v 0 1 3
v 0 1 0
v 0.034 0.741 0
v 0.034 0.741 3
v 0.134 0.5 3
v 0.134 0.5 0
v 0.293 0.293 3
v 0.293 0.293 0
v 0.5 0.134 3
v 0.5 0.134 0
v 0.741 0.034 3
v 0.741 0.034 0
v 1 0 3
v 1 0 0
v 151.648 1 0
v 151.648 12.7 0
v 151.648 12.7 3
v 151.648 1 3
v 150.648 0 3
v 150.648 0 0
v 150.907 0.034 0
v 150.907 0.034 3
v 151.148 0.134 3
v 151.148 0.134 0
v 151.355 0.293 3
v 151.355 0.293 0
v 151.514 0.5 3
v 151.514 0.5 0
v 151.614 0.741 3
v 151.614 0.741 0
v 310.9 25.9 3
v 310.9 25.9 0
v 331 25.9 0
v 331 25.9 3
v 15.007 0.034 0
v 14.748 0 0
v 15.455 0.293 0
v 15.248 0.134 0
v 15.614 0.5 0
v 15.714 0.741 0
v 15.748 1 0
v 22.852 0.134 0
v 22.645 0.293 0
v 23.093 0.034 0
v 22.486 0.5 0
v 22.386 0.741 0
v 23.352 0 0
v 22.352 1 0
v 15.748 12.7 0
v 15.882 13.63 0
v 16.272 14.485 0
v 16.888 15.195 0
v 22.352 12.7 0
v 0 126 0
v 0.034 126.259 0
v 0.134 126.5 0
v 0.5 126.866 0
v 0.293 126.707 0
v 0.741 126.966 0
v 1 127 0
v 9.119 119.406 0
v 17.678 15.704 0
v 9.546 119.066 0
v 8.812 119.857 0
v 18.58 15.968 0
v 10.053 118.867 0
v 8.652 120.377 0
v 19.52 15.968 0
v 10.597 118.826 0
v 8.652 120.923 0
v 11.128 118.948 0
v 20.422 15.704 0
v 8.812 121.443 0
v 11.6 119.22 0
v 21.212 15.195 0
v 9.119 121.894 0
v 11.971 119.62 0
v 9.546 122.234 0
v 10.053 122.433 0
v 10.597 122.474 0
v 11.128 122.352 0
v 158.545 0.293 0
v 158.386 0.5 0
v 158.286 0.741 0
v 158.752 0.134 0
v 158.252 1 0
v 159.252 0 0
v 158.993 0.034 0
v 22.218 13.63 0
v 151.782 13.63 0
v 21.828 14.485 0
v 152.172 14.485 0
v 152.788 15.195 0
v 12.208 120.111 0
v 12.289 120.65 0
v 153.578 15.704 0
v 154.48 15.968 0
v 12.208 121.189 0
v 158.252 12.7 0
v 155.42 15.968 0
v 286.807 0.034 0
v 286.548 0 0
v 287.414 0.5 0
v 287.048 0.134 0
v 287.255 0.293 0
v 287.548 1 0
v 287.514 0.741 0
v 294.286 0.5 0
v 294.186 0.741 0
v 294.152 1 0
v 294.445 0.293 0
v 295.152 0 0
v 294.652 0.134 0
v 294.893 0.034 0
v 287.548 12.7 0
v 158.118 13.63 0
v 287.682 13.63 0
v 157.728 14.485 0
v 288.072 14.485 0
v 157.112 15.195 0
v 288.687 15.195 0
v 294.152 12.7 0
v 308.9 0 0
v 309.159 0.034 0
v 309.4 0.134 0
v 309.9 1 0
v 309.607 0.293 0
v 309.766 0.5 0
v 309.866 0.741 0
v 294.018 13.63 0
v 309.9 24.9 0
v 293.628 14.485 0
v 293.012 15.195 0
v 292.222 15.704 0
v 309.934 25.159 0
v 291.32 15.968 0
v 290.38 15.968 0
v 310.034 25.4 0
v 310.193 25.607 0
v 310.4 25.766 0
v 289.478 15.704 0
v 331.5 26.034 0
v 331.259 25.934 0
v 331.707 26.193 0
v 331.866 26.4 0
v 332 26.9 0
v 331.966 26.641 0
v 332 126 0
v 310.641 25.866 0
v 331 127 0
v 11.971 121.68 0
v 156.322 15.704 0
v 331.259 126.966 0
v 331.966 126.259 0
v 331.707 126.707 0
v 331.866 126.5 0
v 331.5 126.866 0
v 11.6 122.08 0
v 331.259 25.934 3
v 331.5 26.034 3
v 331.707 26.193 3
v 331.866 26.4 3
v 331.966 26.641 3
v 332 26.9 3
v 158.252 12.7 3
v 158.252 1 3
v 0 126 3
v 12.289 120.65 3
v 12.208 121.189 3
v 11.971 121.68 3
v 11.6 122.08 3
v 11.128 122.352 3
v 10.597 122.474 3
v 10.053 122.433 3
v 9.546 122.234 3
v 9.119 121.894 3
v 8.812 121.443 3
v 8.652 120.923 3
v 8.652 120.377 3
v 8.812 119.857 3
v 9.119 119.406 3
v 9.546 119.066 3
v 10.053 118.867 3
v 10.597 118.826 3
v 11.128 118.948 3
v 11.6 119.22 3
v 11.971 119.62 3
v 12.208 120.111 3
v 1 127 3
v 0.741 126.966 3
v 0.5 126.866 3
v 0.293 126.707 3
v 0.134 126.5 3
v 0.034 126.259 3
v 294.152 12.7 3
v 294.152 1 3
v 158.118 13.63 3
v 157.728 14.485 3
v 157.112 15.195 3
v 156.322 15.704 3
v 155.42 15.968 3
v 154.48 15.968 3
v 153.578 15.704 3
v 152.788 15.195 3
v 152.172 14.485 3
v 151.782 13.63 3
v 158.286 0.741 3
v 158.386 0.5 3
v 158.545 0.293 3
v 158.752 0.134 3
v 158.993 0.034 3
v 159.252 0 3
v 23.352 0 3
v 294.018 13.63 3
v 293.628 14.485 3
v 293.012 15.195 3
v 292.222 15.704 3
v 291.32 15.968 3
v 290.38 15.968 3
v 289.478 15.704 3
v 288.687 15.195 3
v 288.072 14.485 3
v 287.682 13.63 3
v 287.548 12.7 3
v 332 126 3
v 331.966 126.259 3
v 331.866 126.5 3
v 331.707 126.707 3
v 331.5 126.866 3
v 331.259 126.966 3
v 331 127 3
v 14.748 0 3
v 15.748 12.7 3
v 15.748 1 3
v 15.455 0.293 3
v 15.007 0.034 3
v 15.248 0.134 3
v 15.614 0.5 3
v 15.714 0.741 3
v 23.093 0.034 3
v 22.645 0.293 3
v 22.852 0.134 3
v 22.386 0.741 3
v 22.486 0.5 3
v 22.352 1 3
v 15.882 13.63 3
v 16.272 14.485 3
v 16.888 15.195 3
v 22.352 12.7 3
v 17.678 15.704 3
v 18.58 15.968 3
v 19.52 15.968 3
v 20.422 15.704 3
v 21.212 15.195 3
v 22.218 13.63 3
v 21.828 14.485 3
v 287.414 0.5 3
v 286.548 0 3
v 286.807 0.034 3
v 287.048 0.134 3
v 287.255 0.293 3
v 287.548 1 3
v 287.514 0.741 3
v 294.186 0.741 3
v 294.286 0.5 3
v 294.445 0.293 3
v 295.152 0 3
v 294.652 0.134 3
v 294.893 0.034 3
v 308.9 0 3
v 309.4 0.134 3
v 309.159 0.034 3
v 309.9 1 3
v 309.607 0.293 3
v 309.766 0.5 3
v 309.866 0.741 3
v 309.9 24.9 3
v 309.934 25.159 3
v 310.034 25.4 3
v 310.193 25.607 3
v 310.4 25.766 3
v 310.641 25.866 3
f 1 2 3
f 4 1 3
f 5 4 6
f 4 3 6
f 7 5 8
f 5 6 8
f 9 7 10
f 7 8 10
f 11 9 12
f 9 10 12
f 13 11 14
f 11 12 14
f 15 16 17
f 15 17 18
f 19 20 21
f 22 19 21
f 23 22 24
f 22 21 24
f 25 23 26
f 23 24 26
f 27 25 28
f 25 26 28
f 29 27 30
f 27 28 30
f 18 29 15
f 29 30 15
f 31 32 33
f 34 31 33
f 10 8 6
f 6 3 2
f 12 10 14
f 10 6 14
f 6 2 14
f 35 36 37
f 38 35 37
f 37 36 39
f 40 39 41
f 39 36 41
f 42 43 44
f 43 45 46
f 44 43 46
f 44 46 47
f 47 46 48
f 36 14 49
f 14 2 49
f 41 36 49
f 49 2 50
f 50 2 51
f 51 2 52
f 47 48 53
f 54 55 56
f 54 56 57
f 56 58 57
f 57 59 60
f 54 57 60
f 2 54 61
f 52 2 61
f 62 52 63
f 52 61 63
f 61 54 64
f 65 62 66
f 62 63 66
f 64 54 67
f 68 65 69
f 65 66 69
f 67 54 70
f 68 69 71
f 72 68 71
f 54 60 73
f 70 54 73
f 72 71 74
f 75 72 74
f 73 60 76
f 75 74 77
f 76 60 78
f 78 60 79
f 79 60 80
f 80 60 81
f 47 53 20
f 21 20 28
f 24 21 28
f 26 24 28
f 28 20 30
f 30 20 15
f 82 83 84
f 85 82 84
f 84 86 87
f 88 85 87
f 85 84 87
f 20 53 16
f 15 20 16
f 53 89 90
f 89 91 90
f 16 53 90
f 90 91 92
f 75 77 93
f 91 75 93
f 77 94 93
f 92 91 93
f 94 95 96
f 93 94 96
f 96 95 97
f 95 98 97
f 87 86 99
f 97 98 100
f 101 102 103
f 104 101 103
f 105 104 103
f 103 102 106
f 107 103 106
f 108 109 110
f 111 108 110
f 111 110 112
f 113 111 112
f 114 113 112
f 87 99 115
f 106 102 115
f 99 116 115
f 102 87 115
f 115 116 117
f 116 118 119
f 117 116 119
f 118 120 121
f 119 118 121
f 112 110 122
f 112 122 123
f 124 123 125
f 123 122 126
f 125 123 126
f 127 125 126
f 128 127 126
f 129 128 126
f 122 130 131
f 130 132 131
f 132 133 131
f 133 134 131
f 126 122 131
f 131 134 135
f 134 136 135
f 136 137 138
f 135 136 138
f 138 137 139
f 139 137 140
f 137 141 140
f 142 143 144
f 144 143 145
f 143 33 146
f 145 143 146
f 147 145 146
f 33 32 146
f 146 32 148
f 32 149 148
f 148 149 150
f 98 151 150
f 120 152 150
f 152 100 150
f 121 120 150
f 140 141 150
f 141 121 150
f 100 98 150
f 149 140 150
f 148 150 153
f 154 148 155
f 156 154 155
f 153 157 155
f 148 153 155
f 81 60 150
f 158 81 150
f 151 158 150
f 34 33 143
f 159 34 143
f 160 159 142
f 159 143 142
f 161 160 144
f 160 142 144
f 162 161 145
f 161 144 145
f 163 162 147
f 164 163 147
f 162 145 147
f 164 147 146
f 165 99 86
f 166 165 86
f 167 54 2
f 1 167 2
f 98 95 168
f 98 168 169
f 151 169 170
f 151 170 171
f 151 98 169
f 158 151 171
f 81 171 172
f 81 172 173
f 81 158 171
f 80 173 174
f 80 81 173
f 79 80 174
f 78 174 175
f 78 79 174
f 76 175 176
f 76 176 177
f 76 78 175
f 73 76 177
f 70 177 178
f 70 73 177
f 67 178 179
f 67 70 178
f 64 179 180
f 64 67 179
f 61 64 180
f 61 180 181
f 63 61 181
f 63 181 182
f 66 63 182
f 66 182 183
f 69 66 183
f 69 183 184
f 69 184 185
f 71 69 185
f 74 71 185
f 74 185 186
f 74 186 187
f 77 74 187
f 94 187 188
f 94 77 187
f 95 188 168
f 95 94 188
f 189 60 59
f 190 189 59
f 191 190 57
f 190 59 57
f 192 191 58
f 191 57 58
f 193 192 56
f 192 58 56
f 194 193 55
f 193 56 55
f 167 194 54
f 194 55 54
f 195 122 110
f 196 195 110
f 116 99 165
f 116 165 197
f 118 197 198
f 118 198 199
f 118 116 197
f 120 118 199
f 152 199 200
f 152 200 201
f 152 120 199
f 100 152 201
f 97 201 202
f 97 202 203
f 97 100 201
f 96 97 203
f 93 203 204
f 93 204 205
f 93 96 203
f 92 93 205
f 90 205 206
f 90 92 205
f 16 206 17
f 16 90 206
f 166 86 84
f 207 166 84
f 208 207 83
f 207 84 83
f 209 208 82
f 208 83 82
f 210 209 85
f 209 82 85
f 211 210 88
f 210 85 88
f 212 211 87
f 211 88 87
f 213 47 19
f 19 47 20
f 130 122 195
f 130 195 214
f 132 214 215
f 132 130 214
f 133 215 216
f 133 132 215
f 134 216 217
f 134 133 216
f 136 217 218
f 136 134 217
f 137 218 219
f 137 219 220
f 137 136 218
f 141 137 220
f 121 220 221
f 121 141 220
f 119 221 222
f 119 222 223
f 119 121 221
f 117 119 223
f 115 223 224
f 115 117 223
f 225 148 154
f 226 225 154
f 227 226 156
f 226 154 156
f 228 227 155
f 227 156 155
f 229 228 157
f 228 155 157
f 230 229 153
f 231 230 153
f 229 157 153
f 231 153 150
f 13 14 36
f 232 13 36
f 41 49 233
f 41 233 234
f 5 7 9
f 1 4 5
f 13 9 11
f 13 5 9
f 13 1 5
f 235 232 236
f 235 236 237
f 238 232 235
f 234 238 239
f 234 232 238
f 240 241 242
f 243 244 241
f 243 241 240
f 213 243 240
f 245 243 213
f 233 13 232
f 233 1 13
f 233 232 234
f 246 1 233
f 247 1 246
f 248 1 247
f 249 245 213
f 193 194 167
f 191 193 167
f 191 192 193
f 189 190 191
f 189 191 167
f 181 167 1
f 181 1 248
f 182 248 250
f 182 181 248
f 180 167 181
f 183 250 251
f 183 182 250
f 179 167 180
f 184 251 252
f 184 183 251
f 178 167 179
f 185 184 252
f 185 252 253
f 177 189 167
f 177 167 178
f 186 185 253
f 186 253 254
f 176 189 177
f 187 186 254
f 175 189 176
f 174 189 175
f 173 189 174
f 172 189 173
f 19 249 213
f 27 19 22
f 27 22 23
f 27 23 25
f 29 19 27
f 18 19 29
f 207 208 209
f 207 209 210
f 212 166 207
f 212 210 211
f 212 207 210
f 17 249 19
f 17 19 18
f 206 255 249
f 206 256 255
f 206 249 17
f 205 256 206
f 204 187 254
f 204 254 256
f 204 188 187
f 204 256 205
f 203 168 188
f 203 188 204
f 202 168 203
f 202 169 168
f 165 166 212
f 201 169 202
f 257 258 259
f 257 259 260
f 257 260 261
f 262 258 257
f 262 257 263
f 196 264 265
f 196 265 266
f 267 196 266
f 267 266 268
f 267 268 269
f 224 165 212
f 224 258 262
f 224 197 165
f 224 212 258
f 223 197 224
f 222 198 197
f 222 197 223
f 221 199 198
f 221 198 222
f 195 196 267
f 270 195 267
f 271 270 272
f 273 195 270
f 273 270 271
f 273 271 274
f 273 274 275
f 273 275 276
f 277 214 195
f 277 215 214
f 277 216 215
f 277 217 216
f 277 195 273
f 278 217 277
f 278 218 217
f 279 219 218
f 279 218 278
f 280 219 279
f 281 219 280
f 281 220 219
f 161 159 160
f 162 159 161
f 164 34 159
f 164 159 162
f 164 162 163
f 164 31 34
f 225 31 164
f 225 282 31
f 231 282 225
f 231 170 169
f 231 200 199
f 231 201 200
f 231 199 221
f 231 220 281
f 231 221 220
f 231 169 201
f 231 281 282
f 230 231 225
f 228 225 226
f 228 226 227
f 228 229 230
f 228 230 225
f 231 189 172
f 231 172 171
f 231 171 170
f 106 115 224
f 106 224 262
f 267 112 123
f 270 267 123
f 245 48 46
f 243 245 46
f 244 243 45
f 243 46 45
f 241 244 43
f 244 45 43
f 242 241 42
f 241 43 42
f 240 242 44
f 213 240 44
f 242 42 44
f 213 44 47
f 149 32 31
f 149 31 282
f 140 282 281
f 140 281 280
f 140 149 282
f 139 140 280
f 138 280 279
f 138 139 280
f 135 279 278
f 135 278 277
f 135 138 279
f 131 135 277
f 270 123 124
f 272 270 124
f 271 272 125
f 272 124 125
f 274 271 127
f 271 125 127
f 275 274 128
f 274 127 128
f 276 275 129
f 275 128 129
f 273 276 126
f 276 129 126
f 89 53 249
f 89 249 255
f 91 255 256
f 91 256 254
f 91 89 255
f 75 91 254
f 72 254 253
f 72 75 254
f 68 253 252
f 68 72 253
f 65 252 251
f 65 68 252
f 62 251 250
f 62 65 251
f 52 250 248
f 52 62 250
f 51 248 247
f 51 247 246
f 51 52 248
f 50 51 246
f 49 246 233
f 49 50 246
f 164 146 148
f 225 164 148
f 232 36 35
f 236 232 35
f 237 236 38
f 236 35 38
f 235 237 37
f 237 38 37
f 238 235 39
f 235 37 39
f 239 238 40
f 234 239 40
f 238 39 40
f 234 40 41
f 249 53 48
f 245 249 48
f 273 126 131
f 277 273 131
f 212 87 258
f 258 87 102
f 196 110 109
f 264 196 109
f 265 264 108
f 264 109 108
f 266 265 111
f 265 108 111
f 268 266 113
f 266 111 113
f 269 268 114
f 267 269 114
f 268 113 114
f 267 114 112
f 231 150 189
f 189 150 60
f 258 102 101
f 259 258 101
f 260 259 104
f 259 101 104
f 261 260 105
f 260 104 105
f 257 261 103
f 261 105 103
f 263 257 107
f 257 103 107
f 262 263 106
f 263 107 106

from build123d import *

# Parameters (mm, degrees)
SKETCH_R  = 1.8288
PAD_DEPTH = 3


with BuildPart() as part:
    # Sketch → Pad (new body)
    with BuildSketch(Plane.XY):
        with BuildLine():
            Line((0, 126), (0, 1))
            ThreePointArc((0, 1), (0.292893, 0.292893), (1, 0))
            Line((1, 0), (14.748, 0))
            ThreePointArc((14.748, 0), (15.455107, 0.292893), (15.748, 1))
            Line((15.748, 12.7), (15.748, 1))
            ThreePointArc((22.352, 12.7), (19.05, 16.002), (15.748, 12.7))
            Line((22.352, 12.7), (22.352, 1))
            ThreePointArc((22.352, 1), (22.644893, 0.292893), (23.352, 0))
            Line((23.352, 0), (150.6479, 0))
            ThreePointArc((150.6479, 0), (151.355007, 0.292893), (151.6479, 1))
            Line((151.6479, 12.7), (151.6479, 1))
            ThreePointArc((158.2519, 12.7), (154.9499, 16.002), (151.6479, 12.7))
            Line((158.2519, 12.7), (158.2519, 1))
            ThreePointArc((158.2519, 1), (158.544793, 0.292893), (159.2519, 0))
            Line((159.2519, 0), (286.5478, 0))
            ThreePointArc((286.5478, 0), (287.254907, 0.292893), (287.5478, 1))
            Line((287.5478, 12.7), (287.5478, 1))
            ThreePointArc((294.1518, 12.7), (290.8498, 16.002), (287.5478, 12.7))
            Line((294.1518, 12.7), (294.1518, 1))
            ThreePointArc((294.1518, 1), (294.444693, 0.292893), (295.1518, 0))
            Line((295.1518, 0), (308.8998, 0))
            ThreePointArc((308.8998, 0), (309.606907, 0.292893), (309.8998, 1))
            Line((309.8998, 1), (309.8998, 24.9))
            ThreePointArc((310.8998, 25.9), (310.192693, 25.607107), (309.8998, 24.9))
            Line((310.8998, 25.9), (330.9999, 25.9))
            ThreePointArc((330.9999, 25.9), (331.707007, 26.192893), (331.9999, 26.9))
            Line((331.9999, 26.9), (331.9999, 126))
            ThreePointArc((331.9999, 126), (331.707007, 126.707107), (330.9999, 127))
            Line((330.9999, 127), (1, 127))
            ThreePointArc((1, 127), (0.292893, 126.707107), (0, 126))
        make_face()
        with Locations((10.46, 120.65)):
            Circle(SKETCH_R, mode=Mode.SUBTRACT)
    extrude(amount=PAD_DEPTH)


solid = part.part
